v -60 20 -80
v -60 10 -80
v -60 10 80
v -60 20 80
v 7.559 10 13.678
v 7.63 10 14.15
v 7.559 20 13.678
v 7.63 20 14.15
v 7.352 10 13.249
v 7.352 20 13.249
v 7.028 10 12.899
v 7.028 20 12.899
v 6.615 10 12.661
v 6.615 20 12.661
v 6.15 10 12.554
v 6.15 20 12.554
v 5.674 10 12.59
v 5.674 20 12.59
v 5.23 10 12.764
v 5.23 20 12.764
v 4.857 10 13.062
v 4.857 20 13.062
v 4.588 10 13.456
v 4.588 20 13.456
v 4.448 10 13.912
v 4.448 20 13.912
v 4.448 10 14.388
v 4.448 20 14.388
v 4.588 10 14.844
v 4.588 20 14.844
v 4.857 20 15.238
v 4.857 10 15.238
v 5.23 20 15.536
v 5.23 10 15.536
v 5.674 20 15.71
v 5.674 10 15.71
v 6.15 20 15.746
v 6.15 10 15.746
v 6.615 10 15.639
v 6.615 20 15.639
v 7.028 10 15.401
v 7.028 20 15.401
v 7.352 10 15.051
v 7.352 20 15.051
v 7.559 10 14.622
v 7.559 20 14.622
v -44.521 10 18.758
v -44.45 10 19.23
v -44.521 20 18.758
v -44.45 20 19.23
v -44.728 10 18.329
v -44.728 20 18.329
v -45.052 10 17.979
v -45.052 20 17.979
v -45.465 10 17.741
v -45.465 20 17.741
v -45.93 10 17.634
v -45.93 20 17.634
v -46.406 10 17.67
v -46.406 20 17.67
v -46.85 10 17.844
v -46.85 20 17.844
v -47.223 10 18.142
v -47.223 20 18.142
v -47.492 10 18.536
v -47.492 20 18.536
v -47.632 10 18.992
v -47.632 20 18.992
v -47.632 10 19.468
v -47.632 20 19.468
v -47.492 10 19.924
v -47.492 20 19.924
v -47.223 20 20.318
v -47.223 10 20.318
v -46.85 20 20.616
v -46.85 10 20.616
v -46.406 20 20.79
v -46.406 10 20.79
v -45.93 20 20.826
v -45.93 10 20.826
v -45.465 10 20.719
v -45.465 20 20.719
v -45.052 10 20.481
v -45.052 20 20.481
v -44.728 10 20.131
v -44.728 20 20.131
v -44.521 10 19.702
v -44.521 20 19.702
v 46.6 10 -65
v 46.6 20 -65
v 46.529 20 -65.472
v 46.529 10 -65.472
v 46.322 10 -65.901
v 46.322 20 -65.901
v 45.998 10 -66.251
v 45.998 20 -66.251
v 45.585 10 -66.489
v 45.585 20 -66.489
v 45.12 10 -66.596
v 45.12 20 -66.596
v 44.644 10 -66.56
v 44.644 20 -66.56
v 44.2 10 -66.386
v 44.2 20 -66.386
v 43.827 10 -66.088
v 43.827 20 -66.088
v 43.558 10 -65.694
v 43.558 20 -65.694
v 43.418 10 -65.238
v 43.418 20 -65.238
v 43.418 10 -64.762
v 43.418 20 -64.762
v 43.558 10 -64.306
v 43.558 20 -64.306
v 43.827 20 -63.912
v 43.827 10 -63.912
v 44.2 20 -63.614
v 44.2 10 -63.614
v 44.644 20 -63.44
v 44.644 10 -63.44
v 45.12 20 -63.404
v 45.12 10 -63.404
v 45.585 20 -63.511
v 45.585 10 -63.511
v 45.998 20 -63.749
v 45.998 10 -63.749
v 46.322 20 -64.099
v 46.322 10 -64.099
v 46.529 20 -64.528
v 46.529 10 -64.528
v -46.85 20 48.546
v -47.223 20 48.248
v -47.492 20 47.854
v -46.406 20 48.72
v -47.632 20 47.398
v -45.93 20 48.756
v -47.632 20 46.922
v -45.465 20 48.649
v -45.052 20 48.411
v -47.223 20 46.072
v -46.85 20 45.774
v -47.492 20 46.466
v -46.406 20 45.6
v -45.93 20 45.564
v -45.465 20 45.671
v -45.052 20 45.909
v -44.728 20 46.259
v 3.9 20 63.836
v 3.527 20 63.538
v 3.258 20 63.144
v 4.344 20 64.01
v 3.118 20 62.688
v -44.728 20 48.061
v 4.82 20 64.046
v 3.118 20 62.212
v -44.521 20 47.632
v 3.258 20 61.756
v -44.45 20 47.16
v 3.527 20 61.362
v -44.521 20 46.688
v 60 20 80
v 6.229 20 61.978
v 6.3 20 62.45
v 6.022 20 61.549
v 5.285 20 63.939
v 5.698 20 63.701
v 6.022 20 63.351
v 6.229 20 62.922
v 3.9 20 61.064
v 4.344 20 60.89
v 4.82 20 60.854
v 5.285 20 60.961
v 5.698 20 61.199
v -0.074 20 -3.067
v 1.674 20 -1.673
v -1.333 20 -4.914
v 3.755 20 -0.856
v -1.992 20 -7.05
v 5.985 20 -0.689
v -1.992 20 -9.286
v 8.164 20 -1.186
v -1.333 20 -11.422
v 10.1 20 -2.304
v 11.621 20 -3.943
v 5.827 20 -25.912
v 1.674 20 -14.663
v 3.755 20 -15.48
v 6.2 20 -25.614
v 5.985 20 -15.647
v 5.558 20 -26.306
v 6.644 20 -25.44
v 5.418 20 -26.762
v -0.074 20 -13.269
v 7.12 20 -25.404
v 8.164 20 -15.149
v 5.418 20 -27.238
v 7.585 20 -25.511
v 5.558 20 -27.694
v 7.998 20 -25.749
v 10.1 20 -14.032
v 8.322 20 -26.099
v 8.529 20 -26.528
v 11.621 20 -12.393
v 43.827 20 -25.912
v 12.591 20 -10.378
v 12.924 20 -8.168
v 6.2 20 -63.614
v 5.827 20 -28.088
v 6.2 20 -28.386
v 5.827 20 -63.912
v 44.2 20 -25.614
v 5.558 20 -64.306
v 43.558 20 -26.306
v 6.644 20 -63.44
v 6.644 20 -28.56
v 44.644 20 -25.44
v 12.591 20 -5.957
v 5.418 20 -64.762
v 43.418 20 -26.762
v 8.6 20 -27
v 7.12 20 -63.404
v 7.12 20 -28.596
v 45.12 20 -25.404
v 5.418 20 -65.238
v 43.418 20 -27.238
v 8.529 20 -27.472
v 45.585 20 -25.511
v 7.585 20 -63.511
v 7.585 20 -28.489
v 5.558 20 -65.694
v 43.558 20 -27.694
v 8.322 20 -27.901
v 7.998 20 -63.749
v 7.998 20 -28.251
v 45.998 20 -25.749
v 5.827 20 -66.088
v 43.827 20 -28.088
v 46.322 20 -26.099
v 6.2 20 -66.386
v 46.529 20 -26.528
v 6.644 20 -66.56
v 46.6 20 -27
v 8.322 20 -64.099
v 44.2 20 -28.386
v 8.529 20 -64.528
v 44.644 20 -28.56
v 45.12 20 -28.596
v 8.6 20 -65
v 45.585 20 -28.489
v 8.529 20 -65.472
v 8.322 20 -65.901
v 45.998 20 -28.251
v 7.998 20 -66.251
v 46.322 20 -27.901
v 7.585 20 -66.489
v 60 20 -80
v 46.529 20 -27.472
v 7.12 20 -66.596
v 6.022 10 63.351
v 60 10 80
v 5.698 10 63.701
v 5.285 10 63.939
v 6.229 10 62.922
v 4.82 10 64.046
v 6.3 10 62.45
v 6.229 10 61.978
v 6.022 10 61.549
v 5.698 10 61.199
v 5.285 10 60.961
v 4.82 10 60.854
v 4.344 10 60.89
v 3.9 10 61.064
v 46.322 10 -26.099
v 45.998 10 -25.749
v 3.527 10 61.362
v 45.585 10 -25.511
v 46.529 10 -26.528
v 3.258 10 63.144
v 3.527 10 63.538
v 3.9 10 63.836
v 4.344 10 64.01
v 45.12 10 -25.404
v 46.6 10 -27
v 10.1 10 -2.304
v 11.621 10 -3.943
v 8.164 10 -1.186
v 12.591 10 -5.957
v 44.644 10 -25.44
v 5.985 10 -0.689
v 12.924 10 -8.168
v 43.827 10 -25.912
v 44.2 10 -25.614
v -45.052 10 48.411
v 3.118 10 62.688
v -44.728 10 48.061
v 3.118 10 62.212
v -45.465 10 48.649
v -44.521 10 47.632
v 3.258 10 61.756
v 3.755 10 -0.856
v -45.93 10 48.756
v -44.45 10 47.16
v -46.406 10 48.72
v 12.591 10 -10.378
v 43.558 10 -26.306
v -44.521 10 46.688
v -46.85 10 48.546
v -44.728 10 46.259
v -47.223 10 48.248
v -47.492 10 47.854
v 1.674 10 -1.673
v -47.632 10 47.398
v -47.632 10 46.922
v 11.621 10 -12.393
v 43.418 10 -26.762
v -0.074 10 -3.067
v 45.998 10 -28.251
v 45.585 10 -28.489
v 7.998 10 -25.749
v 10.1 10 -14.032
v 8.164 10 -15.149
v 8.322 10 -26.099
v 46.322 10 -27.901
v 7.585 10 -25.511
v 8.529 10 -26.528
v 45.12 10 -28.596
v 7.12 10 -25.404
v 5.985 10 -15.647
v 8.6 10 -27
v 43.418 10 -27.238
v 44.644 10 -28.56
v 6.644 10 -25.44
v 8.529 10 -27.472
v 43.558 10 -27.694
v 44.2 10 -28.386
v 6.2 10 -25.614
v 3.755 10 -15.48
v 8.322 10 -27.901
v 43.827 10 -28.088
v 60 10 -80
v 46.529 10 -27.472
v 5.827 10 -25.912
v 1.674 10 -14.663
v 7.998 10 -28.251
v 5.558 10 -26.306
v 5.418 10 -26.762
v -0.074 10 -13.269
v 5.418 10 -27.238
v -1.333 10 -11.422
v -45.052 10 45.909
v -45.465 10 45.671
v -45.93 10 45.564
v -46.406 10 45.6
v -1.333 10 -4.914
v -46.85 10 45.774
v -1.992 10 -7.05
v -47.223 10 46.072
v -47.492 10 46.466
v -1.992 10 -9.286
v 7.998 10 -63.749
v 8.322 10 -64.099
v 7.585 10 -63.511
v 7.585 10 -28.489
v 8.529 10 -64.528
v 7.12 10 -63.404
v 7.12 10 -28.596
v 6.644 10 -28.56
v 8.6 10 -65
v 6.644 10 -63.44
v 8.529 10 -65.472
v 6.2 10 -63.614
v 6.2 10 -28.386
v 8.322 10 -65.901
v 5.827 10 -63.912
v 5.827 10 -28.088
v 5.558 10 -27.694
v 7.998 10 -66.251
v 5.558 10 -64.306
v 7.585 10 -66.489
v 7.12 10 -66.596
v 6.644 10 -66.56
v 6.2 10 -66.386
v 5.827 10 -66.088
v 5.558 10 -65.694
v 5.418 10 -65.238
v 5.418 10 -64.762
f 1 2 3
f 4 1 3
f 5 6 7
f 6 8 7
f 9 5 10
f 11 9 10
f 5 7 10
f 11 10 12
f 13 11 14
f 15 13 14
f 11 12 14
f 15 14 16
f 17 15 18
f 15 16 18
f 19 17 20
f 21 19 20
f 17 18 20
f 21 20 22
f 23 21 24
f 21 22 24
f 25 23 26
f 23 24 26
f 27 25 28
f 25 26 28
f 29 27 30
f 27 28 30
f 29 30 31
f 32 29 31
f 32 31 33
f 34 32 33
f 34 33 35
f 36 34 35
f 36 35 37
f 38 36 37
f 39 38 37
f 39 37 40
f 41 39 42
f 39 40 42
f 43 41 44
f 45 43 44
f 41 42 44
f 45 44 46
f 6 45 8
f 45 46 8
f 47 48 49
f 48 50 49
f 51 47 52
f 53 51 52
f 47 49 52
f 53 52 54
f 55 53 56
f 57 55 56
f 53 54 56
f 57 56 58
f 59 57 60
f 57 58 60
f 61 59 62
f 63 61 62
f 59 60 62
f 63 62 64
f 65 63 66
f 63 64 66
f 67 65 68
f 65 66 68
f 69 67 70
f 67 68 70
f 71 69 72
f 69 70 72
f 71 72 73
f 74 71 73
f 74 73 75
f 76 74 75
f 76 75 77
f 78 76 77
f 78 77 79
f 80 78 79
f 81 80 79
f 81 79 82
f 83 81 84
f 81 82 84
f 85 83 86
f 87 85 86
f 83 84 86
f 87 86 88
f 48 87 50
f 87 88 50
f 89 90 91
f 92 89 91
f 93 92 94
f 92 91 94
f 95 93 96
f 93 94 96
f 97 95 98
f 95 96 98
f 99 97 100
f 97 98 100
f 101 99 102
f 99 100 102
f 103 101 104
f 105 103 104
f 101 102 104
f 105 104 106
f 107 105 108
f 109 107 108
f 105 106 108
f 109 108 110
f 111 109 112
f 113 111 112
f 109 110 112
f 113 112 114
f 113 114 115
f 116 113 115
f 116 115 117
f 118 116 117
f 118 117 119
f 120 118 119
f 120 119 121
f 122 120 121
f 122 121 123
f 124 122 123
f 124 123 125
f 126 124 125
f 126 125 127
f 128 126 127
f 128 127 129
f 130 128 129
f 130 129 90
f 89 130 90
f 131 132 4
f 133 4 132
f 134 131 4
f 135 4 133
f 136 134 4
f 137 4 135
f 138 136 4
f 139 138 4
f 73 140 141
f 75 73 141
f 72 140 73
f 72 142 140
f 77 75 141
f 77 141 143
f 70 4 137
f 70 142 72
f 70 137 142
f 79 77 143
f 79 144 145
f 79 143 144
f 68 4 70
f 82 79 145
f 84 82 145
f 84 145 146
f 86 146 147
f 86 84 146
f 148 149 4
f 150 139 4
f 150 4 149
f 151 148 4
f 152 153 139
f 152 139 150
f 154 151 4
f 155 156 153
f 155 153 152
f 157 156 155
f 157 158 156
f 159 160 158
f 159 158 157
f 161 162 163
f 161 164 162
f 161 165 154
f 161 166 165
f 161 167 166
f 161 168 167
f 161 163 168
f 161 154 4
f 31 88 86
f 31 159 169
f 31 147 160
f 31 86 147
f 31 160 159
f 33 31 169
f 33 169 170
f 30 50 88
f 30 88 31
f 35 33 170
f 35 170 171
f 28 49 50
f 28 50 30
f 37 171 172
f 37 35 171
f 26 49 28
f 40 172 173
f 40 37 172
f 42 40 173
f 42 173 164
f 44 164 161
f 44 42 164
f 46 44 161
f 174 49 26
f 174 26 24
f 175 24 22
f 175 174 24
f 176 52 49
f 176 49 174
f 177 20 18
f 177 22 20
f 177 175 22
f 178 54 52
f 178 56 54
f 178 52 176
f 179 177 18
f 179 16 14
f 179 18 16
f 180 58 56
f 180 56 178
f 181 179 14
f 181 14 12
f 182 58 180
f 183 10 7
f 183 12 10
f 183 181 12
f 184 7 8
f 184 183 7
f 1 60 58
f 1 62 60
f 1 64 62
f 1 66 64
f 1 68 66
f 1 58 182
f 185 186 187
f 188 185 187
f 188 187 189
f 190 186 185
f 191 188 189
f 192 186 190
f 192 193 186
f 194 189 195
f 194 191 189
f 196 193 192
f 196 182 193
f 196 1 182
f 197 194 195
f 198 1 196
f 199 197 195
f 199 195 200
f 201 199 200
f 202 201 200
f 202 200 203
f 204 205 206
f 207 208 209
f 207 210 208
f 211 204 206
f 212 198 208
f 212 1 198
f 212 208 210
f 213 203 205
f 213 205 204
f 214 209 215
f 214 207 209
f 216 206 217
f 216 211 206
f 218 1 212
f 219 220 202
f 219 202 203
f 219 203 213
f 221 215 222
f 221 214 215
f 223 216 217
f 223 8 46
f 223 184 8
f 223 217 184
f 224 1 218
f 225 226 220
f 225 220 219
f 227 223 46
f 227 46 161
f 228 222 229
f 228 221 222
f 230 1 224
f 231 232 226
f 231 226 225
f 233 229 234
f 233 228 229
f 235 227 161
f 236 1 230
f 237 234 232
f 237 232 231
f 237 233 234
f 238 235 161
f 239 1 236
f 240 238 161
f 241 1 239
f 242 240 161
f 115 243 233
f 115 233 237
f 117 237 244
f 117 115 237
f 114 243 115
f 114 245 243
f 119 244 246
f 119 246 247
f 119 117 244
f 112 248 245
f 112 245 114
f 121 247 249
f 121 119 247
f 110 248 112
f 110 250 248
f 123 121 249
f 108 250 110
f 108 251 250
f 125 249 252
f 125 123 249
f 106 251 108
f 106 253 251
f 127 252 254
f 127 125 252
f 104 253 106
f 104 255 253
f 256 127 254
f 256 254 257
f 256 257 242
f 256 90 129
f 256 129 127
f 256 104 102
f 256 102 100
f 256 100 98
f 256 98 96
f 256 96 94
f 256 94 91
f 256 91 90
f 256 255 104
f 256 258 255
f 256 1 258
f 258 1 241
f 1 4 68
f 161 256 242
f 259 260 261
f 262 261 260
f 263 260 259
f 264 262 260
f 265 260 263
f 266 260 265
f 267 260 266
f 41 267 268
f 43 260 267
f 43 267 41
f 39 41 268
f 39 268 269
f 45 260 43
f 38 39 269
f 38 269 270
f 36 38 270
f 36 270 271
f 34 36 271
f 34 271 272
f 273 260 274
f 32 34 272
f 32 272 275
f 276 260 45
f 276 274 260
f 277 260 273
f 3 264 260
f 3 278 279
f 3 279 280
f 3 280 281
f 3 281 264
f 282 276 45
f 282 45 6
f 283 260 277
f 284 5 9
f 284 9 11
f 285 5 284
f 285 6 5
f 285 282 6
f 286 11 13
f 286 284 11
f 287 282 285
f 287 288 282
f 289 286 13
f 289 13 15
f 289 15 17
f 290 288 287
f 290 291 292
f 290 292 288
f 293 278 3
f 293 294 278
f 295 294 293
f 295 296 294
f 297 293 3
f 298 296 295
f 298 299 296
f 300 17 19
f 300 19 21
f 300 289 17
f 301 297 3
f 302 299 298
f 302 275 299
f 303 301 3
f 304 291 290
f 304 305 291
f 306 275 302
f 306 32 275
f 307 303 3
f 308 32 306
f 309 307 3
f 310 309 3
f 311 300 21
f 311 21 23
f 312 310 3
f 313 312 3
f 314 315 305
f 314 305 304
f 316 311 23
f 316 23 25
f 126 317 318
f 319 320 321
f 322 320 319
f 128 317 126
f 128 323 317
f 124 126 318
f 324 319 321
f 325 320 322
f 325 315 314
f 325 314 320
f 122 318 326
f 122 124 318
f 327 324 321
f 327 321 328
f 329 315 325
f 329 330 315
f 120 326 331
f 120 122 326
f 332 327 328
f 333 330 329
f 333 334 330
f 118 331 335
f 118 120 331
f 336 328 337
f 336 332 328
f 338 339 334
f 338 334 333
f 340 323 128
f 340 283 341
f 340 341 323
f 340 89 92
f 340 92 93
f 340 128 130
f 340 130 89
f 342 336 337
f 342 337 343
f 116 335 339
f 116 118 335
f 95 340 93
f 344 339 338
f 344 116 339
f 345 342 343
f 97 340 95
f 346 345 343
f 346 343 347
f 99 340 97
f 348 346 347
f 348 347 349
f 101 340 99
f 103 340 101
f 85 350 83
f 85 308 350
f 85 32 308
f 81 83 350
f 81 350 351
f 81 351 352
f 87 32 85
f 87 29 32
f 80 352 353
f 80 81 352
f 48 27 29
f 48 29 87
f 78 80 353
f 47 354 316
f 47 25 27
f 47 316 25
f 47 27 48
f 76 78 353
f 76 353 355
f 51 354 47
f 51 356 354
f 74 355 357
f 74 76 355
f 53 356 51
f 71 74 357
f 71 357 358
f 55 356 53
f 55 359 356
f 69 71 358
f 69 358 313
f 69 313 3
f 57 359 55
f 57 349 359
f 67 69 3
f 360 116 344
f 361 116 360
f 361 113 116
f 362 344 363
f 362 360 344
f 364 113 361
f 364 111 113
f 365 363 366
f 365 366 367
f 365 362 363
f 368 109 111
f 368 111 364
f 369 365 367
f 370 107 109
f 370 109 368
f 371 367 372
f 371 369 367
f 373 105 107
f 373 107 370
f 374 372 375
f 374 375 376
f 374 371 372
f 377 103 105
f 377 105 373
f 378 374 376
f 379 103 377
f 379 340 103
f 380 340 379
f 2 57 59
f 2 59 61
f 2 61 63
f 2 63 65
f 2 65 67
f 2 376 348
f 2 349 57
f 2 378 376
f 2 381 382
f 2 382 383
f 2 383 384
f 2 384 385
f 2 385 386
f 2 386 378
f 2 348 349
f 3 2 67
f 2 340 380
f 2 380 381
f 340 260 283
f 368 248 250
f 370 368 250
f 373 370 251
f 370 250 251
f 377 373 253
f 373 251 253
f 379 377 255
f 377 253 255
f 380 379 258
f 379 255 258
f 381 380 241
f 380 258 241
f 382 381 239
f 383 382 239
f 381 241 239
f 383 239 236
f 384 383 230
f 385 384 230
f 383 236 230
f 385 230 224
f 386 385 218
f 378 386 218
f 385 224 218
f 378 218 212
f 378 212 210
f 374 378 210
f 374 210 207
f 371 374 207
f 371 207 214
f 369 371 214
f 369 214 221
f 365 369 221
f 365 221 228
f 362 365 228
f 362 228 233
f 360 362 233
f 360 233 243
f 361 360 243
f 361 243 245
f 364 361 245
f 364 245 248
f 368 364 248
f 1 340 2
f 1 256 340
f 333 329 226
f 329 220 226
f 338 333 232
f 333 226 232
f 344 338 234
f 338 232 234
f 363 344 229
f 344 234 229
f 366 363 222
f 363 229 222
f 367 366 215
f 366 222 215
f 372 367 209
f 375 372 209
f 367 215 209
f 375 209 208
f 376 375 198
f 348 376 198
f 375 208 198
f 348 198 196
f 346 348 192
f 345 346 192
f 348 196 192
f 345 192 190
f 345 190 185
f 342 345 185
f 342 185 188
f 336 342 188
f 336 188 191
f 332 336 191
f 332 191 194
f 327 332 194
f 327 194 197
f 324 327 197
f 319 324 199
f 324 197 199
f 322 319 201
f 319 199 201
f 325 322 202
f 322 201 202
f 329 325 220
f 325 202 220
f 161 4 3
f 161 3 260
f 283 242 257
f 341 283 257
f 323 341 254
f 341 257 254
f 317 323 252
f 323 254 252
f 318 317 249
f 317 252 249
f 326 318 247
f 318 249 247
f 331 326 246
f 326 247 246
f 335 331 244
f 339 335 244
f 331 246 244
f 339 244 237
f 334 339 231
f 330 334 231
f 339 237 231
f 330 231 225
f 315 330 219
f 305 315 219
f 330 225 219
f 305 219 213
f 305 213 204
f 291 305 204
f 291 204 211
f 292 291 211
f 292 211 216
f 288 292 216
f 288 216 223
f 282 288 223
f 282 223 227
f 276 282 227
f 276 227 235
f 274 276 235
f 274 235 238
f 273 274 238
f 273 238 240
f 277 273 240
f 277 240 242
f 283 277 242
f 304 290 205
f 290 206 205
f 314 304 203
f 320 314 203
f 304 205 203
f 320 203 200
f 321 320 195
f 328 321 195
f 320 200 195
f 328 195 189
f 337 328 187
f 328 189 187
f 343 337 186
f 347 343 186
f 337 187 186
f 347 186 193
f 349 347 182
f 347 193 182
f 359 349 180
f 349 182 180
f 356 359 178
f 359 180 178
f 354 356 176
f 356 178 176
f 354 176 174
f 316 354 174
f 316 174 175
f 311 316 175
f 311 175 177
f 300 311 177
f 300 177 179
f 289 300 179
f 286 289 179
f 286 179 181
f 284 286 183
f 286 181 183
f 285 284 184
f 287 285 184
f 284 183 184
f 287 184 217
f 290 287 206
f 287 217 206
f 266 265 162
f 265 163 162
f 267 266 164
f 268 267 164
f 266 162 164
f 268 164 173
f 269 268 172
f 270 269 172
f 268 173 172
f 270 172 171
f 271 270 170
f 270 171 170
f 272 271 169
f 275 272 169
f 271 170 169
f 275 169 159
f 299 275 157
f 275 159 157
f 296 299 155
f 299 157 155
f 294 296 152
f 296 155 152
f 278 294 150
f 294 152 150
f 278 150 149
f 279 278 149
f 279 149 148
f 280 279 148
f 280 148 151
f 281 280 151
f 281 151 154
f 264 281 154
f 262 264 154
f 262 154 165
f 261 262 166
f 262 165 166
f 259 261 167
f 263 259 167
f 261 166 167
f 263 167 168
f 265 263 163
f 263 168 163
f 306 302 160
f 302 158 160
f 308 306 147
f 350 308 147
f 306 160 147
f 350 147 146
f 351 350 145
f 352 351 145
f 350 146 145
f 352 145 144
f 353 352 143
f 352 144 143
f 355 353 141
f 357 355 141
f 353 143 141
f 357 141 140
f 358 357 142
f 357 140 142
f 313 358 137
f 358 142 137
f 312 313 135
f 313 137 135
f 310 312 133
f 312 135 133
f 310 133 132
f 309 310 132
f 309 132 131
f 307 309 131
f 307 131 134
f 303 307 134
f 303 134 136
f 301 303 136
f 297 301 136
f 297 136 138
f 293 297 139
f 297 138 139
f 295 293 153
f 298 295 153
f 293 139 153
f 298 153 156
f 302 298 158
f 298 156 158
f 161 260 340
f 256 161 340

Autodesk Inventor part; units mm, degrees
ref_plane "YZ Plane" through (0, 0, 0) normal (1, 0, 0) x (0, 1, 0)
ref_plane "XZ Plane" through (0, 0, 0) normal (0, 1, 0) x (-1, 0, 0)
ref_plane "XY Plane" through (0, 0, 0) normal (0, 0, 1) x (1, 0, 0)
sketch "스케치1" plane through (0, 0, 0) normal (0, 1, 0) x (-1, 0, 0)
  line L0 (60, 80) -> (-60, 80)
  line L1 (-60, 80) -> (-60, -80)
  line L2 (-60, -80) -> (60, -80)
  line L3 (60, -80) -> (60, 80)
  line L4 (60, 80) -> (-60, -80) construction
  line L5 (-60, 80) -> (60, -80) construction
  point P0 (0, 0)
  dimension "d0" = 120
  dimension "d1" = 160
extrude "돌출1" add sketch "스케치1" along normal blind 60
sketch "스케치2" plane through (0, 60, 0) normal (0, 1, 0) x (1, 0, 0)
  line L0 (60, -80) -> (60, 80) projected
  line L1 (60, 80) -> (-60, 80) projected
  line L2 (55, 102.1646) -> (-55, 102.1646)
  line L3 (-55, 102.1646) -> (-55, -89.711)
  line L4 (-55, -89.711) -> (55, -89.711)
  line L5 (55, -89.711) -> (55, 102.1646)
  line L6 (-60, 80) -> (-60, -80) projected
  point P0 (0, 0)
  point P1 (55, 80)
  point P2 (-55, 80)
  dimension "d6" = 5
  dimension "d7" = 5
extrude "돌출2" cut sketch "스케치2" against normal blind 40 contours L5 L4 L3 L1
sketch "스케치12" plane through (60, 0, -80) normal (0, 0, -1) x (-1, 0, 0)
  line L0 (-34.8463, 10) -> (156.2634, 10)
  line L1 (156.2634, 10) -> (156.2634, -36.9465)
  line L2 (156.2634, -36.9465) -> (-34.8463, -36.9465)
  line L3 (-34.8463, -36.9465) -> (-34.8463, 10)
  line L4 (0, 0) -> (120, 0) projected
  point P0 (60, 0)
  dimension "d85" = 10
extrude "돌출10" cut sketch "스케치12" against normal through all
sketch "스케치13" plane through (-55, 20, 80) normal (0, 0, 1) x (1, 0, 0)
  line L0 (0, 40) -> (0, 0) projected
  line L1 (0, 0) -> (110, 0) projected
  line L2 (0, 40) -> (110, 40)
  line L3 (110, 40) -> (110, 0)
  line L4 (110, 0) -> (0, 0)
  line L5 (0, 0) -> (0, 40)
  point P0 (55, -20)
extrude "돌출11" add sketch "스케치13" against normal blind 5
sketch "스케치14" plane through (55, 20, -80) normal (0, 0, -1) x (-1, 0, 0)
  line L0 (0, 0) -> (0, 40) projected
  line L1 (110, 0) -> (0, 0) projected
  line L2 (0, 40) -> (110, 40)
  line L3 (110, 40) -> (110, 0)
  line L4 (110, 0) -> (0, 0)
  line L5 (0, 0) -> (0, 40)
  point P0 (55, -20)
extrude "돌출12" add sketch "스케치14" against normal blind 5
sketch "스케치15" plane through (60, 60, -80) normal (0, 0, -1) x (-1, 0, 0)
  point P0 (60, -60)
sketch "스케치16" plane through (60, 60, -80) normal (0, 0, -1) x (-1, 0, 0)
  point P0 (60, -60)
sketch "스케치17" plane through (0, 20, 0) normal (0, 1, 0) x (1, 0, 0)
  line L0 (7, 27) -> (45, 27)
  line L1 (45, 27) -> (45, 65)
  line L2 (45, 65) -> (7, 65)
  line L3 (7, 65) -> (7, 27)
  line L4 (55, 75) -> (55, -75) projected
  line L5 (55, 75) -> (-55, 75) projected
  circle A0 centre (7, 27) radius 1.6
  circle A1 centre (7, 65) radius 1.6
  circle A2 centre (45, 65) radius 1.6
  circle A3 centre (45, 27) radius 1.6
  line L6 (-47.9371, 14.7215) -> (-7.9371, 14.7215)
  line L7 (-7.9371, 14.7215) -> (-7.9371, 64.7215)
  line L8 (-7.9371, 64.7215) -> (-47.9371, 64.7215)
  line L9 (-47.9371, 64.7215) -> (-47.9371, 14.7215)
  point P0 (0, 0)
  dimension "d92" = 38
  dimension "d93" = 38
  dimension "d95" = 10
  dimension "d96" = 10
  dimension "d97" = 3.2
  dimension "d98" = 3.2
  dimension "d99" = 3.2
  dimension "d100" = 3.2
  dimension "d113" = 40
  dimension "d114" = 50
extrude "돌출13" cut sketch "스케치17" against normal through all contours L3 A0 L0 | L0 A0 L3 | A3 L1 L0 | L0 L1 A3 | A1 L2 L3 | L3 L2 A1 | A2 L2 L1 | L1 L2 A2
sketch "스케치21" plane through (0, 20, 0) normal (0, 1, 0) x (1, 0, 0)
  circle A0 centre (5.4243, 8.1678) radius 7.5
  line L0 (-49.3888, 17.2731) -> (-9.3888, 17.2731)
  line L1 (-9.3888, 17.2731) -> (-9.3888, 67.2731)
  line L2 (-9.3888, 67.2731) -> (-49.3888, 67.2731)
  line L3 (-49.3888, 67.2731) -> (-49.3888, 17.2731)
  point P0 (0, 0)
  dimension "d117" = 15
  dimension "d118" = 50
  dimension "d119" = 40
extrude "돌출15" cut sketch "스케치21" against normal through all contours A0
sketch "스케치23" plane through (0, 20, 0) normal (0, 1, 0) x (1, 0, 0)
  line L0 (-48.6, -65) -> (20, -65)
  line L1 (20, -65) -> (20, -11.6)
  line L2 (20, -11.6) -> (-48.6, -11.6)
  line L3 (-48.6, -11.6) -> (-48.6, -65)
  line L4 (55, 75) -> (55, -75) projected
  line L5 (-55, -75) -> (55, -75) projected
  circle A0 centre (4.7, -62.45) radius 1.6
  circle A1 centre (6.03, -14.15) radius 1.6
  circle A2 centre (-46.05, -47.16) radius 1.6
  circle A3 centre (-46.05, -19.23) radius 1.6
  point P0 (0, 0)
  dimension "d123" = 68.6
  dimension "d124" = 53.4
  dimension "d125" = 35
  dimension "d126" = 10
  dimension "d127" = 3.2
  dimension "d128" = 15.3
  dimension "d129" = 2.55
  dimension "d130" = 3.2
  dimension "d131" = 13.97
  dimension "d132" = 2.55
  dimension "d133" = 3.2
  dimension "d134" = 35.56
  dimension "d135" = 3.2
  dimension "d136" = 2.55
  dimension "d137" = 2.55
  dimension "d138" = 7.63
extrude "돌출16" cut sketch "스케치23" against normal through all contours A0 | A1 | A2 | A3
sketch "스케치24" plane through (0, 60, 0) normal (0, 1, 0) x (1, 0, 0)
  line L0 (-60, 80) -> (-60, -80) projected
  line L1 (60, 80) -> (-60, 80) projected
  line L2 (-60, -80) -> (60, -80)
  line L3 (60, -80) -> (60, 80)
  line L4 (60, 80) -> (-60, 80)
  line L5 (-60, 80) -> (-60, -80)
  point P0 (0, 0)
extrude "돌출17" cut sketch "스케치24" against normal blind 40
sketch "스케치25" plane through (60, 20, -80) normal (0, 0, -1) x (-1, 0, 0)
  point P0 (60, -20)
sketch "스케치26" plane through (0, 20, 0) normal (0, 1, 0) x (1, 0, 0)
  point P0 (0, 0)
properties part number "본체 밑판"
